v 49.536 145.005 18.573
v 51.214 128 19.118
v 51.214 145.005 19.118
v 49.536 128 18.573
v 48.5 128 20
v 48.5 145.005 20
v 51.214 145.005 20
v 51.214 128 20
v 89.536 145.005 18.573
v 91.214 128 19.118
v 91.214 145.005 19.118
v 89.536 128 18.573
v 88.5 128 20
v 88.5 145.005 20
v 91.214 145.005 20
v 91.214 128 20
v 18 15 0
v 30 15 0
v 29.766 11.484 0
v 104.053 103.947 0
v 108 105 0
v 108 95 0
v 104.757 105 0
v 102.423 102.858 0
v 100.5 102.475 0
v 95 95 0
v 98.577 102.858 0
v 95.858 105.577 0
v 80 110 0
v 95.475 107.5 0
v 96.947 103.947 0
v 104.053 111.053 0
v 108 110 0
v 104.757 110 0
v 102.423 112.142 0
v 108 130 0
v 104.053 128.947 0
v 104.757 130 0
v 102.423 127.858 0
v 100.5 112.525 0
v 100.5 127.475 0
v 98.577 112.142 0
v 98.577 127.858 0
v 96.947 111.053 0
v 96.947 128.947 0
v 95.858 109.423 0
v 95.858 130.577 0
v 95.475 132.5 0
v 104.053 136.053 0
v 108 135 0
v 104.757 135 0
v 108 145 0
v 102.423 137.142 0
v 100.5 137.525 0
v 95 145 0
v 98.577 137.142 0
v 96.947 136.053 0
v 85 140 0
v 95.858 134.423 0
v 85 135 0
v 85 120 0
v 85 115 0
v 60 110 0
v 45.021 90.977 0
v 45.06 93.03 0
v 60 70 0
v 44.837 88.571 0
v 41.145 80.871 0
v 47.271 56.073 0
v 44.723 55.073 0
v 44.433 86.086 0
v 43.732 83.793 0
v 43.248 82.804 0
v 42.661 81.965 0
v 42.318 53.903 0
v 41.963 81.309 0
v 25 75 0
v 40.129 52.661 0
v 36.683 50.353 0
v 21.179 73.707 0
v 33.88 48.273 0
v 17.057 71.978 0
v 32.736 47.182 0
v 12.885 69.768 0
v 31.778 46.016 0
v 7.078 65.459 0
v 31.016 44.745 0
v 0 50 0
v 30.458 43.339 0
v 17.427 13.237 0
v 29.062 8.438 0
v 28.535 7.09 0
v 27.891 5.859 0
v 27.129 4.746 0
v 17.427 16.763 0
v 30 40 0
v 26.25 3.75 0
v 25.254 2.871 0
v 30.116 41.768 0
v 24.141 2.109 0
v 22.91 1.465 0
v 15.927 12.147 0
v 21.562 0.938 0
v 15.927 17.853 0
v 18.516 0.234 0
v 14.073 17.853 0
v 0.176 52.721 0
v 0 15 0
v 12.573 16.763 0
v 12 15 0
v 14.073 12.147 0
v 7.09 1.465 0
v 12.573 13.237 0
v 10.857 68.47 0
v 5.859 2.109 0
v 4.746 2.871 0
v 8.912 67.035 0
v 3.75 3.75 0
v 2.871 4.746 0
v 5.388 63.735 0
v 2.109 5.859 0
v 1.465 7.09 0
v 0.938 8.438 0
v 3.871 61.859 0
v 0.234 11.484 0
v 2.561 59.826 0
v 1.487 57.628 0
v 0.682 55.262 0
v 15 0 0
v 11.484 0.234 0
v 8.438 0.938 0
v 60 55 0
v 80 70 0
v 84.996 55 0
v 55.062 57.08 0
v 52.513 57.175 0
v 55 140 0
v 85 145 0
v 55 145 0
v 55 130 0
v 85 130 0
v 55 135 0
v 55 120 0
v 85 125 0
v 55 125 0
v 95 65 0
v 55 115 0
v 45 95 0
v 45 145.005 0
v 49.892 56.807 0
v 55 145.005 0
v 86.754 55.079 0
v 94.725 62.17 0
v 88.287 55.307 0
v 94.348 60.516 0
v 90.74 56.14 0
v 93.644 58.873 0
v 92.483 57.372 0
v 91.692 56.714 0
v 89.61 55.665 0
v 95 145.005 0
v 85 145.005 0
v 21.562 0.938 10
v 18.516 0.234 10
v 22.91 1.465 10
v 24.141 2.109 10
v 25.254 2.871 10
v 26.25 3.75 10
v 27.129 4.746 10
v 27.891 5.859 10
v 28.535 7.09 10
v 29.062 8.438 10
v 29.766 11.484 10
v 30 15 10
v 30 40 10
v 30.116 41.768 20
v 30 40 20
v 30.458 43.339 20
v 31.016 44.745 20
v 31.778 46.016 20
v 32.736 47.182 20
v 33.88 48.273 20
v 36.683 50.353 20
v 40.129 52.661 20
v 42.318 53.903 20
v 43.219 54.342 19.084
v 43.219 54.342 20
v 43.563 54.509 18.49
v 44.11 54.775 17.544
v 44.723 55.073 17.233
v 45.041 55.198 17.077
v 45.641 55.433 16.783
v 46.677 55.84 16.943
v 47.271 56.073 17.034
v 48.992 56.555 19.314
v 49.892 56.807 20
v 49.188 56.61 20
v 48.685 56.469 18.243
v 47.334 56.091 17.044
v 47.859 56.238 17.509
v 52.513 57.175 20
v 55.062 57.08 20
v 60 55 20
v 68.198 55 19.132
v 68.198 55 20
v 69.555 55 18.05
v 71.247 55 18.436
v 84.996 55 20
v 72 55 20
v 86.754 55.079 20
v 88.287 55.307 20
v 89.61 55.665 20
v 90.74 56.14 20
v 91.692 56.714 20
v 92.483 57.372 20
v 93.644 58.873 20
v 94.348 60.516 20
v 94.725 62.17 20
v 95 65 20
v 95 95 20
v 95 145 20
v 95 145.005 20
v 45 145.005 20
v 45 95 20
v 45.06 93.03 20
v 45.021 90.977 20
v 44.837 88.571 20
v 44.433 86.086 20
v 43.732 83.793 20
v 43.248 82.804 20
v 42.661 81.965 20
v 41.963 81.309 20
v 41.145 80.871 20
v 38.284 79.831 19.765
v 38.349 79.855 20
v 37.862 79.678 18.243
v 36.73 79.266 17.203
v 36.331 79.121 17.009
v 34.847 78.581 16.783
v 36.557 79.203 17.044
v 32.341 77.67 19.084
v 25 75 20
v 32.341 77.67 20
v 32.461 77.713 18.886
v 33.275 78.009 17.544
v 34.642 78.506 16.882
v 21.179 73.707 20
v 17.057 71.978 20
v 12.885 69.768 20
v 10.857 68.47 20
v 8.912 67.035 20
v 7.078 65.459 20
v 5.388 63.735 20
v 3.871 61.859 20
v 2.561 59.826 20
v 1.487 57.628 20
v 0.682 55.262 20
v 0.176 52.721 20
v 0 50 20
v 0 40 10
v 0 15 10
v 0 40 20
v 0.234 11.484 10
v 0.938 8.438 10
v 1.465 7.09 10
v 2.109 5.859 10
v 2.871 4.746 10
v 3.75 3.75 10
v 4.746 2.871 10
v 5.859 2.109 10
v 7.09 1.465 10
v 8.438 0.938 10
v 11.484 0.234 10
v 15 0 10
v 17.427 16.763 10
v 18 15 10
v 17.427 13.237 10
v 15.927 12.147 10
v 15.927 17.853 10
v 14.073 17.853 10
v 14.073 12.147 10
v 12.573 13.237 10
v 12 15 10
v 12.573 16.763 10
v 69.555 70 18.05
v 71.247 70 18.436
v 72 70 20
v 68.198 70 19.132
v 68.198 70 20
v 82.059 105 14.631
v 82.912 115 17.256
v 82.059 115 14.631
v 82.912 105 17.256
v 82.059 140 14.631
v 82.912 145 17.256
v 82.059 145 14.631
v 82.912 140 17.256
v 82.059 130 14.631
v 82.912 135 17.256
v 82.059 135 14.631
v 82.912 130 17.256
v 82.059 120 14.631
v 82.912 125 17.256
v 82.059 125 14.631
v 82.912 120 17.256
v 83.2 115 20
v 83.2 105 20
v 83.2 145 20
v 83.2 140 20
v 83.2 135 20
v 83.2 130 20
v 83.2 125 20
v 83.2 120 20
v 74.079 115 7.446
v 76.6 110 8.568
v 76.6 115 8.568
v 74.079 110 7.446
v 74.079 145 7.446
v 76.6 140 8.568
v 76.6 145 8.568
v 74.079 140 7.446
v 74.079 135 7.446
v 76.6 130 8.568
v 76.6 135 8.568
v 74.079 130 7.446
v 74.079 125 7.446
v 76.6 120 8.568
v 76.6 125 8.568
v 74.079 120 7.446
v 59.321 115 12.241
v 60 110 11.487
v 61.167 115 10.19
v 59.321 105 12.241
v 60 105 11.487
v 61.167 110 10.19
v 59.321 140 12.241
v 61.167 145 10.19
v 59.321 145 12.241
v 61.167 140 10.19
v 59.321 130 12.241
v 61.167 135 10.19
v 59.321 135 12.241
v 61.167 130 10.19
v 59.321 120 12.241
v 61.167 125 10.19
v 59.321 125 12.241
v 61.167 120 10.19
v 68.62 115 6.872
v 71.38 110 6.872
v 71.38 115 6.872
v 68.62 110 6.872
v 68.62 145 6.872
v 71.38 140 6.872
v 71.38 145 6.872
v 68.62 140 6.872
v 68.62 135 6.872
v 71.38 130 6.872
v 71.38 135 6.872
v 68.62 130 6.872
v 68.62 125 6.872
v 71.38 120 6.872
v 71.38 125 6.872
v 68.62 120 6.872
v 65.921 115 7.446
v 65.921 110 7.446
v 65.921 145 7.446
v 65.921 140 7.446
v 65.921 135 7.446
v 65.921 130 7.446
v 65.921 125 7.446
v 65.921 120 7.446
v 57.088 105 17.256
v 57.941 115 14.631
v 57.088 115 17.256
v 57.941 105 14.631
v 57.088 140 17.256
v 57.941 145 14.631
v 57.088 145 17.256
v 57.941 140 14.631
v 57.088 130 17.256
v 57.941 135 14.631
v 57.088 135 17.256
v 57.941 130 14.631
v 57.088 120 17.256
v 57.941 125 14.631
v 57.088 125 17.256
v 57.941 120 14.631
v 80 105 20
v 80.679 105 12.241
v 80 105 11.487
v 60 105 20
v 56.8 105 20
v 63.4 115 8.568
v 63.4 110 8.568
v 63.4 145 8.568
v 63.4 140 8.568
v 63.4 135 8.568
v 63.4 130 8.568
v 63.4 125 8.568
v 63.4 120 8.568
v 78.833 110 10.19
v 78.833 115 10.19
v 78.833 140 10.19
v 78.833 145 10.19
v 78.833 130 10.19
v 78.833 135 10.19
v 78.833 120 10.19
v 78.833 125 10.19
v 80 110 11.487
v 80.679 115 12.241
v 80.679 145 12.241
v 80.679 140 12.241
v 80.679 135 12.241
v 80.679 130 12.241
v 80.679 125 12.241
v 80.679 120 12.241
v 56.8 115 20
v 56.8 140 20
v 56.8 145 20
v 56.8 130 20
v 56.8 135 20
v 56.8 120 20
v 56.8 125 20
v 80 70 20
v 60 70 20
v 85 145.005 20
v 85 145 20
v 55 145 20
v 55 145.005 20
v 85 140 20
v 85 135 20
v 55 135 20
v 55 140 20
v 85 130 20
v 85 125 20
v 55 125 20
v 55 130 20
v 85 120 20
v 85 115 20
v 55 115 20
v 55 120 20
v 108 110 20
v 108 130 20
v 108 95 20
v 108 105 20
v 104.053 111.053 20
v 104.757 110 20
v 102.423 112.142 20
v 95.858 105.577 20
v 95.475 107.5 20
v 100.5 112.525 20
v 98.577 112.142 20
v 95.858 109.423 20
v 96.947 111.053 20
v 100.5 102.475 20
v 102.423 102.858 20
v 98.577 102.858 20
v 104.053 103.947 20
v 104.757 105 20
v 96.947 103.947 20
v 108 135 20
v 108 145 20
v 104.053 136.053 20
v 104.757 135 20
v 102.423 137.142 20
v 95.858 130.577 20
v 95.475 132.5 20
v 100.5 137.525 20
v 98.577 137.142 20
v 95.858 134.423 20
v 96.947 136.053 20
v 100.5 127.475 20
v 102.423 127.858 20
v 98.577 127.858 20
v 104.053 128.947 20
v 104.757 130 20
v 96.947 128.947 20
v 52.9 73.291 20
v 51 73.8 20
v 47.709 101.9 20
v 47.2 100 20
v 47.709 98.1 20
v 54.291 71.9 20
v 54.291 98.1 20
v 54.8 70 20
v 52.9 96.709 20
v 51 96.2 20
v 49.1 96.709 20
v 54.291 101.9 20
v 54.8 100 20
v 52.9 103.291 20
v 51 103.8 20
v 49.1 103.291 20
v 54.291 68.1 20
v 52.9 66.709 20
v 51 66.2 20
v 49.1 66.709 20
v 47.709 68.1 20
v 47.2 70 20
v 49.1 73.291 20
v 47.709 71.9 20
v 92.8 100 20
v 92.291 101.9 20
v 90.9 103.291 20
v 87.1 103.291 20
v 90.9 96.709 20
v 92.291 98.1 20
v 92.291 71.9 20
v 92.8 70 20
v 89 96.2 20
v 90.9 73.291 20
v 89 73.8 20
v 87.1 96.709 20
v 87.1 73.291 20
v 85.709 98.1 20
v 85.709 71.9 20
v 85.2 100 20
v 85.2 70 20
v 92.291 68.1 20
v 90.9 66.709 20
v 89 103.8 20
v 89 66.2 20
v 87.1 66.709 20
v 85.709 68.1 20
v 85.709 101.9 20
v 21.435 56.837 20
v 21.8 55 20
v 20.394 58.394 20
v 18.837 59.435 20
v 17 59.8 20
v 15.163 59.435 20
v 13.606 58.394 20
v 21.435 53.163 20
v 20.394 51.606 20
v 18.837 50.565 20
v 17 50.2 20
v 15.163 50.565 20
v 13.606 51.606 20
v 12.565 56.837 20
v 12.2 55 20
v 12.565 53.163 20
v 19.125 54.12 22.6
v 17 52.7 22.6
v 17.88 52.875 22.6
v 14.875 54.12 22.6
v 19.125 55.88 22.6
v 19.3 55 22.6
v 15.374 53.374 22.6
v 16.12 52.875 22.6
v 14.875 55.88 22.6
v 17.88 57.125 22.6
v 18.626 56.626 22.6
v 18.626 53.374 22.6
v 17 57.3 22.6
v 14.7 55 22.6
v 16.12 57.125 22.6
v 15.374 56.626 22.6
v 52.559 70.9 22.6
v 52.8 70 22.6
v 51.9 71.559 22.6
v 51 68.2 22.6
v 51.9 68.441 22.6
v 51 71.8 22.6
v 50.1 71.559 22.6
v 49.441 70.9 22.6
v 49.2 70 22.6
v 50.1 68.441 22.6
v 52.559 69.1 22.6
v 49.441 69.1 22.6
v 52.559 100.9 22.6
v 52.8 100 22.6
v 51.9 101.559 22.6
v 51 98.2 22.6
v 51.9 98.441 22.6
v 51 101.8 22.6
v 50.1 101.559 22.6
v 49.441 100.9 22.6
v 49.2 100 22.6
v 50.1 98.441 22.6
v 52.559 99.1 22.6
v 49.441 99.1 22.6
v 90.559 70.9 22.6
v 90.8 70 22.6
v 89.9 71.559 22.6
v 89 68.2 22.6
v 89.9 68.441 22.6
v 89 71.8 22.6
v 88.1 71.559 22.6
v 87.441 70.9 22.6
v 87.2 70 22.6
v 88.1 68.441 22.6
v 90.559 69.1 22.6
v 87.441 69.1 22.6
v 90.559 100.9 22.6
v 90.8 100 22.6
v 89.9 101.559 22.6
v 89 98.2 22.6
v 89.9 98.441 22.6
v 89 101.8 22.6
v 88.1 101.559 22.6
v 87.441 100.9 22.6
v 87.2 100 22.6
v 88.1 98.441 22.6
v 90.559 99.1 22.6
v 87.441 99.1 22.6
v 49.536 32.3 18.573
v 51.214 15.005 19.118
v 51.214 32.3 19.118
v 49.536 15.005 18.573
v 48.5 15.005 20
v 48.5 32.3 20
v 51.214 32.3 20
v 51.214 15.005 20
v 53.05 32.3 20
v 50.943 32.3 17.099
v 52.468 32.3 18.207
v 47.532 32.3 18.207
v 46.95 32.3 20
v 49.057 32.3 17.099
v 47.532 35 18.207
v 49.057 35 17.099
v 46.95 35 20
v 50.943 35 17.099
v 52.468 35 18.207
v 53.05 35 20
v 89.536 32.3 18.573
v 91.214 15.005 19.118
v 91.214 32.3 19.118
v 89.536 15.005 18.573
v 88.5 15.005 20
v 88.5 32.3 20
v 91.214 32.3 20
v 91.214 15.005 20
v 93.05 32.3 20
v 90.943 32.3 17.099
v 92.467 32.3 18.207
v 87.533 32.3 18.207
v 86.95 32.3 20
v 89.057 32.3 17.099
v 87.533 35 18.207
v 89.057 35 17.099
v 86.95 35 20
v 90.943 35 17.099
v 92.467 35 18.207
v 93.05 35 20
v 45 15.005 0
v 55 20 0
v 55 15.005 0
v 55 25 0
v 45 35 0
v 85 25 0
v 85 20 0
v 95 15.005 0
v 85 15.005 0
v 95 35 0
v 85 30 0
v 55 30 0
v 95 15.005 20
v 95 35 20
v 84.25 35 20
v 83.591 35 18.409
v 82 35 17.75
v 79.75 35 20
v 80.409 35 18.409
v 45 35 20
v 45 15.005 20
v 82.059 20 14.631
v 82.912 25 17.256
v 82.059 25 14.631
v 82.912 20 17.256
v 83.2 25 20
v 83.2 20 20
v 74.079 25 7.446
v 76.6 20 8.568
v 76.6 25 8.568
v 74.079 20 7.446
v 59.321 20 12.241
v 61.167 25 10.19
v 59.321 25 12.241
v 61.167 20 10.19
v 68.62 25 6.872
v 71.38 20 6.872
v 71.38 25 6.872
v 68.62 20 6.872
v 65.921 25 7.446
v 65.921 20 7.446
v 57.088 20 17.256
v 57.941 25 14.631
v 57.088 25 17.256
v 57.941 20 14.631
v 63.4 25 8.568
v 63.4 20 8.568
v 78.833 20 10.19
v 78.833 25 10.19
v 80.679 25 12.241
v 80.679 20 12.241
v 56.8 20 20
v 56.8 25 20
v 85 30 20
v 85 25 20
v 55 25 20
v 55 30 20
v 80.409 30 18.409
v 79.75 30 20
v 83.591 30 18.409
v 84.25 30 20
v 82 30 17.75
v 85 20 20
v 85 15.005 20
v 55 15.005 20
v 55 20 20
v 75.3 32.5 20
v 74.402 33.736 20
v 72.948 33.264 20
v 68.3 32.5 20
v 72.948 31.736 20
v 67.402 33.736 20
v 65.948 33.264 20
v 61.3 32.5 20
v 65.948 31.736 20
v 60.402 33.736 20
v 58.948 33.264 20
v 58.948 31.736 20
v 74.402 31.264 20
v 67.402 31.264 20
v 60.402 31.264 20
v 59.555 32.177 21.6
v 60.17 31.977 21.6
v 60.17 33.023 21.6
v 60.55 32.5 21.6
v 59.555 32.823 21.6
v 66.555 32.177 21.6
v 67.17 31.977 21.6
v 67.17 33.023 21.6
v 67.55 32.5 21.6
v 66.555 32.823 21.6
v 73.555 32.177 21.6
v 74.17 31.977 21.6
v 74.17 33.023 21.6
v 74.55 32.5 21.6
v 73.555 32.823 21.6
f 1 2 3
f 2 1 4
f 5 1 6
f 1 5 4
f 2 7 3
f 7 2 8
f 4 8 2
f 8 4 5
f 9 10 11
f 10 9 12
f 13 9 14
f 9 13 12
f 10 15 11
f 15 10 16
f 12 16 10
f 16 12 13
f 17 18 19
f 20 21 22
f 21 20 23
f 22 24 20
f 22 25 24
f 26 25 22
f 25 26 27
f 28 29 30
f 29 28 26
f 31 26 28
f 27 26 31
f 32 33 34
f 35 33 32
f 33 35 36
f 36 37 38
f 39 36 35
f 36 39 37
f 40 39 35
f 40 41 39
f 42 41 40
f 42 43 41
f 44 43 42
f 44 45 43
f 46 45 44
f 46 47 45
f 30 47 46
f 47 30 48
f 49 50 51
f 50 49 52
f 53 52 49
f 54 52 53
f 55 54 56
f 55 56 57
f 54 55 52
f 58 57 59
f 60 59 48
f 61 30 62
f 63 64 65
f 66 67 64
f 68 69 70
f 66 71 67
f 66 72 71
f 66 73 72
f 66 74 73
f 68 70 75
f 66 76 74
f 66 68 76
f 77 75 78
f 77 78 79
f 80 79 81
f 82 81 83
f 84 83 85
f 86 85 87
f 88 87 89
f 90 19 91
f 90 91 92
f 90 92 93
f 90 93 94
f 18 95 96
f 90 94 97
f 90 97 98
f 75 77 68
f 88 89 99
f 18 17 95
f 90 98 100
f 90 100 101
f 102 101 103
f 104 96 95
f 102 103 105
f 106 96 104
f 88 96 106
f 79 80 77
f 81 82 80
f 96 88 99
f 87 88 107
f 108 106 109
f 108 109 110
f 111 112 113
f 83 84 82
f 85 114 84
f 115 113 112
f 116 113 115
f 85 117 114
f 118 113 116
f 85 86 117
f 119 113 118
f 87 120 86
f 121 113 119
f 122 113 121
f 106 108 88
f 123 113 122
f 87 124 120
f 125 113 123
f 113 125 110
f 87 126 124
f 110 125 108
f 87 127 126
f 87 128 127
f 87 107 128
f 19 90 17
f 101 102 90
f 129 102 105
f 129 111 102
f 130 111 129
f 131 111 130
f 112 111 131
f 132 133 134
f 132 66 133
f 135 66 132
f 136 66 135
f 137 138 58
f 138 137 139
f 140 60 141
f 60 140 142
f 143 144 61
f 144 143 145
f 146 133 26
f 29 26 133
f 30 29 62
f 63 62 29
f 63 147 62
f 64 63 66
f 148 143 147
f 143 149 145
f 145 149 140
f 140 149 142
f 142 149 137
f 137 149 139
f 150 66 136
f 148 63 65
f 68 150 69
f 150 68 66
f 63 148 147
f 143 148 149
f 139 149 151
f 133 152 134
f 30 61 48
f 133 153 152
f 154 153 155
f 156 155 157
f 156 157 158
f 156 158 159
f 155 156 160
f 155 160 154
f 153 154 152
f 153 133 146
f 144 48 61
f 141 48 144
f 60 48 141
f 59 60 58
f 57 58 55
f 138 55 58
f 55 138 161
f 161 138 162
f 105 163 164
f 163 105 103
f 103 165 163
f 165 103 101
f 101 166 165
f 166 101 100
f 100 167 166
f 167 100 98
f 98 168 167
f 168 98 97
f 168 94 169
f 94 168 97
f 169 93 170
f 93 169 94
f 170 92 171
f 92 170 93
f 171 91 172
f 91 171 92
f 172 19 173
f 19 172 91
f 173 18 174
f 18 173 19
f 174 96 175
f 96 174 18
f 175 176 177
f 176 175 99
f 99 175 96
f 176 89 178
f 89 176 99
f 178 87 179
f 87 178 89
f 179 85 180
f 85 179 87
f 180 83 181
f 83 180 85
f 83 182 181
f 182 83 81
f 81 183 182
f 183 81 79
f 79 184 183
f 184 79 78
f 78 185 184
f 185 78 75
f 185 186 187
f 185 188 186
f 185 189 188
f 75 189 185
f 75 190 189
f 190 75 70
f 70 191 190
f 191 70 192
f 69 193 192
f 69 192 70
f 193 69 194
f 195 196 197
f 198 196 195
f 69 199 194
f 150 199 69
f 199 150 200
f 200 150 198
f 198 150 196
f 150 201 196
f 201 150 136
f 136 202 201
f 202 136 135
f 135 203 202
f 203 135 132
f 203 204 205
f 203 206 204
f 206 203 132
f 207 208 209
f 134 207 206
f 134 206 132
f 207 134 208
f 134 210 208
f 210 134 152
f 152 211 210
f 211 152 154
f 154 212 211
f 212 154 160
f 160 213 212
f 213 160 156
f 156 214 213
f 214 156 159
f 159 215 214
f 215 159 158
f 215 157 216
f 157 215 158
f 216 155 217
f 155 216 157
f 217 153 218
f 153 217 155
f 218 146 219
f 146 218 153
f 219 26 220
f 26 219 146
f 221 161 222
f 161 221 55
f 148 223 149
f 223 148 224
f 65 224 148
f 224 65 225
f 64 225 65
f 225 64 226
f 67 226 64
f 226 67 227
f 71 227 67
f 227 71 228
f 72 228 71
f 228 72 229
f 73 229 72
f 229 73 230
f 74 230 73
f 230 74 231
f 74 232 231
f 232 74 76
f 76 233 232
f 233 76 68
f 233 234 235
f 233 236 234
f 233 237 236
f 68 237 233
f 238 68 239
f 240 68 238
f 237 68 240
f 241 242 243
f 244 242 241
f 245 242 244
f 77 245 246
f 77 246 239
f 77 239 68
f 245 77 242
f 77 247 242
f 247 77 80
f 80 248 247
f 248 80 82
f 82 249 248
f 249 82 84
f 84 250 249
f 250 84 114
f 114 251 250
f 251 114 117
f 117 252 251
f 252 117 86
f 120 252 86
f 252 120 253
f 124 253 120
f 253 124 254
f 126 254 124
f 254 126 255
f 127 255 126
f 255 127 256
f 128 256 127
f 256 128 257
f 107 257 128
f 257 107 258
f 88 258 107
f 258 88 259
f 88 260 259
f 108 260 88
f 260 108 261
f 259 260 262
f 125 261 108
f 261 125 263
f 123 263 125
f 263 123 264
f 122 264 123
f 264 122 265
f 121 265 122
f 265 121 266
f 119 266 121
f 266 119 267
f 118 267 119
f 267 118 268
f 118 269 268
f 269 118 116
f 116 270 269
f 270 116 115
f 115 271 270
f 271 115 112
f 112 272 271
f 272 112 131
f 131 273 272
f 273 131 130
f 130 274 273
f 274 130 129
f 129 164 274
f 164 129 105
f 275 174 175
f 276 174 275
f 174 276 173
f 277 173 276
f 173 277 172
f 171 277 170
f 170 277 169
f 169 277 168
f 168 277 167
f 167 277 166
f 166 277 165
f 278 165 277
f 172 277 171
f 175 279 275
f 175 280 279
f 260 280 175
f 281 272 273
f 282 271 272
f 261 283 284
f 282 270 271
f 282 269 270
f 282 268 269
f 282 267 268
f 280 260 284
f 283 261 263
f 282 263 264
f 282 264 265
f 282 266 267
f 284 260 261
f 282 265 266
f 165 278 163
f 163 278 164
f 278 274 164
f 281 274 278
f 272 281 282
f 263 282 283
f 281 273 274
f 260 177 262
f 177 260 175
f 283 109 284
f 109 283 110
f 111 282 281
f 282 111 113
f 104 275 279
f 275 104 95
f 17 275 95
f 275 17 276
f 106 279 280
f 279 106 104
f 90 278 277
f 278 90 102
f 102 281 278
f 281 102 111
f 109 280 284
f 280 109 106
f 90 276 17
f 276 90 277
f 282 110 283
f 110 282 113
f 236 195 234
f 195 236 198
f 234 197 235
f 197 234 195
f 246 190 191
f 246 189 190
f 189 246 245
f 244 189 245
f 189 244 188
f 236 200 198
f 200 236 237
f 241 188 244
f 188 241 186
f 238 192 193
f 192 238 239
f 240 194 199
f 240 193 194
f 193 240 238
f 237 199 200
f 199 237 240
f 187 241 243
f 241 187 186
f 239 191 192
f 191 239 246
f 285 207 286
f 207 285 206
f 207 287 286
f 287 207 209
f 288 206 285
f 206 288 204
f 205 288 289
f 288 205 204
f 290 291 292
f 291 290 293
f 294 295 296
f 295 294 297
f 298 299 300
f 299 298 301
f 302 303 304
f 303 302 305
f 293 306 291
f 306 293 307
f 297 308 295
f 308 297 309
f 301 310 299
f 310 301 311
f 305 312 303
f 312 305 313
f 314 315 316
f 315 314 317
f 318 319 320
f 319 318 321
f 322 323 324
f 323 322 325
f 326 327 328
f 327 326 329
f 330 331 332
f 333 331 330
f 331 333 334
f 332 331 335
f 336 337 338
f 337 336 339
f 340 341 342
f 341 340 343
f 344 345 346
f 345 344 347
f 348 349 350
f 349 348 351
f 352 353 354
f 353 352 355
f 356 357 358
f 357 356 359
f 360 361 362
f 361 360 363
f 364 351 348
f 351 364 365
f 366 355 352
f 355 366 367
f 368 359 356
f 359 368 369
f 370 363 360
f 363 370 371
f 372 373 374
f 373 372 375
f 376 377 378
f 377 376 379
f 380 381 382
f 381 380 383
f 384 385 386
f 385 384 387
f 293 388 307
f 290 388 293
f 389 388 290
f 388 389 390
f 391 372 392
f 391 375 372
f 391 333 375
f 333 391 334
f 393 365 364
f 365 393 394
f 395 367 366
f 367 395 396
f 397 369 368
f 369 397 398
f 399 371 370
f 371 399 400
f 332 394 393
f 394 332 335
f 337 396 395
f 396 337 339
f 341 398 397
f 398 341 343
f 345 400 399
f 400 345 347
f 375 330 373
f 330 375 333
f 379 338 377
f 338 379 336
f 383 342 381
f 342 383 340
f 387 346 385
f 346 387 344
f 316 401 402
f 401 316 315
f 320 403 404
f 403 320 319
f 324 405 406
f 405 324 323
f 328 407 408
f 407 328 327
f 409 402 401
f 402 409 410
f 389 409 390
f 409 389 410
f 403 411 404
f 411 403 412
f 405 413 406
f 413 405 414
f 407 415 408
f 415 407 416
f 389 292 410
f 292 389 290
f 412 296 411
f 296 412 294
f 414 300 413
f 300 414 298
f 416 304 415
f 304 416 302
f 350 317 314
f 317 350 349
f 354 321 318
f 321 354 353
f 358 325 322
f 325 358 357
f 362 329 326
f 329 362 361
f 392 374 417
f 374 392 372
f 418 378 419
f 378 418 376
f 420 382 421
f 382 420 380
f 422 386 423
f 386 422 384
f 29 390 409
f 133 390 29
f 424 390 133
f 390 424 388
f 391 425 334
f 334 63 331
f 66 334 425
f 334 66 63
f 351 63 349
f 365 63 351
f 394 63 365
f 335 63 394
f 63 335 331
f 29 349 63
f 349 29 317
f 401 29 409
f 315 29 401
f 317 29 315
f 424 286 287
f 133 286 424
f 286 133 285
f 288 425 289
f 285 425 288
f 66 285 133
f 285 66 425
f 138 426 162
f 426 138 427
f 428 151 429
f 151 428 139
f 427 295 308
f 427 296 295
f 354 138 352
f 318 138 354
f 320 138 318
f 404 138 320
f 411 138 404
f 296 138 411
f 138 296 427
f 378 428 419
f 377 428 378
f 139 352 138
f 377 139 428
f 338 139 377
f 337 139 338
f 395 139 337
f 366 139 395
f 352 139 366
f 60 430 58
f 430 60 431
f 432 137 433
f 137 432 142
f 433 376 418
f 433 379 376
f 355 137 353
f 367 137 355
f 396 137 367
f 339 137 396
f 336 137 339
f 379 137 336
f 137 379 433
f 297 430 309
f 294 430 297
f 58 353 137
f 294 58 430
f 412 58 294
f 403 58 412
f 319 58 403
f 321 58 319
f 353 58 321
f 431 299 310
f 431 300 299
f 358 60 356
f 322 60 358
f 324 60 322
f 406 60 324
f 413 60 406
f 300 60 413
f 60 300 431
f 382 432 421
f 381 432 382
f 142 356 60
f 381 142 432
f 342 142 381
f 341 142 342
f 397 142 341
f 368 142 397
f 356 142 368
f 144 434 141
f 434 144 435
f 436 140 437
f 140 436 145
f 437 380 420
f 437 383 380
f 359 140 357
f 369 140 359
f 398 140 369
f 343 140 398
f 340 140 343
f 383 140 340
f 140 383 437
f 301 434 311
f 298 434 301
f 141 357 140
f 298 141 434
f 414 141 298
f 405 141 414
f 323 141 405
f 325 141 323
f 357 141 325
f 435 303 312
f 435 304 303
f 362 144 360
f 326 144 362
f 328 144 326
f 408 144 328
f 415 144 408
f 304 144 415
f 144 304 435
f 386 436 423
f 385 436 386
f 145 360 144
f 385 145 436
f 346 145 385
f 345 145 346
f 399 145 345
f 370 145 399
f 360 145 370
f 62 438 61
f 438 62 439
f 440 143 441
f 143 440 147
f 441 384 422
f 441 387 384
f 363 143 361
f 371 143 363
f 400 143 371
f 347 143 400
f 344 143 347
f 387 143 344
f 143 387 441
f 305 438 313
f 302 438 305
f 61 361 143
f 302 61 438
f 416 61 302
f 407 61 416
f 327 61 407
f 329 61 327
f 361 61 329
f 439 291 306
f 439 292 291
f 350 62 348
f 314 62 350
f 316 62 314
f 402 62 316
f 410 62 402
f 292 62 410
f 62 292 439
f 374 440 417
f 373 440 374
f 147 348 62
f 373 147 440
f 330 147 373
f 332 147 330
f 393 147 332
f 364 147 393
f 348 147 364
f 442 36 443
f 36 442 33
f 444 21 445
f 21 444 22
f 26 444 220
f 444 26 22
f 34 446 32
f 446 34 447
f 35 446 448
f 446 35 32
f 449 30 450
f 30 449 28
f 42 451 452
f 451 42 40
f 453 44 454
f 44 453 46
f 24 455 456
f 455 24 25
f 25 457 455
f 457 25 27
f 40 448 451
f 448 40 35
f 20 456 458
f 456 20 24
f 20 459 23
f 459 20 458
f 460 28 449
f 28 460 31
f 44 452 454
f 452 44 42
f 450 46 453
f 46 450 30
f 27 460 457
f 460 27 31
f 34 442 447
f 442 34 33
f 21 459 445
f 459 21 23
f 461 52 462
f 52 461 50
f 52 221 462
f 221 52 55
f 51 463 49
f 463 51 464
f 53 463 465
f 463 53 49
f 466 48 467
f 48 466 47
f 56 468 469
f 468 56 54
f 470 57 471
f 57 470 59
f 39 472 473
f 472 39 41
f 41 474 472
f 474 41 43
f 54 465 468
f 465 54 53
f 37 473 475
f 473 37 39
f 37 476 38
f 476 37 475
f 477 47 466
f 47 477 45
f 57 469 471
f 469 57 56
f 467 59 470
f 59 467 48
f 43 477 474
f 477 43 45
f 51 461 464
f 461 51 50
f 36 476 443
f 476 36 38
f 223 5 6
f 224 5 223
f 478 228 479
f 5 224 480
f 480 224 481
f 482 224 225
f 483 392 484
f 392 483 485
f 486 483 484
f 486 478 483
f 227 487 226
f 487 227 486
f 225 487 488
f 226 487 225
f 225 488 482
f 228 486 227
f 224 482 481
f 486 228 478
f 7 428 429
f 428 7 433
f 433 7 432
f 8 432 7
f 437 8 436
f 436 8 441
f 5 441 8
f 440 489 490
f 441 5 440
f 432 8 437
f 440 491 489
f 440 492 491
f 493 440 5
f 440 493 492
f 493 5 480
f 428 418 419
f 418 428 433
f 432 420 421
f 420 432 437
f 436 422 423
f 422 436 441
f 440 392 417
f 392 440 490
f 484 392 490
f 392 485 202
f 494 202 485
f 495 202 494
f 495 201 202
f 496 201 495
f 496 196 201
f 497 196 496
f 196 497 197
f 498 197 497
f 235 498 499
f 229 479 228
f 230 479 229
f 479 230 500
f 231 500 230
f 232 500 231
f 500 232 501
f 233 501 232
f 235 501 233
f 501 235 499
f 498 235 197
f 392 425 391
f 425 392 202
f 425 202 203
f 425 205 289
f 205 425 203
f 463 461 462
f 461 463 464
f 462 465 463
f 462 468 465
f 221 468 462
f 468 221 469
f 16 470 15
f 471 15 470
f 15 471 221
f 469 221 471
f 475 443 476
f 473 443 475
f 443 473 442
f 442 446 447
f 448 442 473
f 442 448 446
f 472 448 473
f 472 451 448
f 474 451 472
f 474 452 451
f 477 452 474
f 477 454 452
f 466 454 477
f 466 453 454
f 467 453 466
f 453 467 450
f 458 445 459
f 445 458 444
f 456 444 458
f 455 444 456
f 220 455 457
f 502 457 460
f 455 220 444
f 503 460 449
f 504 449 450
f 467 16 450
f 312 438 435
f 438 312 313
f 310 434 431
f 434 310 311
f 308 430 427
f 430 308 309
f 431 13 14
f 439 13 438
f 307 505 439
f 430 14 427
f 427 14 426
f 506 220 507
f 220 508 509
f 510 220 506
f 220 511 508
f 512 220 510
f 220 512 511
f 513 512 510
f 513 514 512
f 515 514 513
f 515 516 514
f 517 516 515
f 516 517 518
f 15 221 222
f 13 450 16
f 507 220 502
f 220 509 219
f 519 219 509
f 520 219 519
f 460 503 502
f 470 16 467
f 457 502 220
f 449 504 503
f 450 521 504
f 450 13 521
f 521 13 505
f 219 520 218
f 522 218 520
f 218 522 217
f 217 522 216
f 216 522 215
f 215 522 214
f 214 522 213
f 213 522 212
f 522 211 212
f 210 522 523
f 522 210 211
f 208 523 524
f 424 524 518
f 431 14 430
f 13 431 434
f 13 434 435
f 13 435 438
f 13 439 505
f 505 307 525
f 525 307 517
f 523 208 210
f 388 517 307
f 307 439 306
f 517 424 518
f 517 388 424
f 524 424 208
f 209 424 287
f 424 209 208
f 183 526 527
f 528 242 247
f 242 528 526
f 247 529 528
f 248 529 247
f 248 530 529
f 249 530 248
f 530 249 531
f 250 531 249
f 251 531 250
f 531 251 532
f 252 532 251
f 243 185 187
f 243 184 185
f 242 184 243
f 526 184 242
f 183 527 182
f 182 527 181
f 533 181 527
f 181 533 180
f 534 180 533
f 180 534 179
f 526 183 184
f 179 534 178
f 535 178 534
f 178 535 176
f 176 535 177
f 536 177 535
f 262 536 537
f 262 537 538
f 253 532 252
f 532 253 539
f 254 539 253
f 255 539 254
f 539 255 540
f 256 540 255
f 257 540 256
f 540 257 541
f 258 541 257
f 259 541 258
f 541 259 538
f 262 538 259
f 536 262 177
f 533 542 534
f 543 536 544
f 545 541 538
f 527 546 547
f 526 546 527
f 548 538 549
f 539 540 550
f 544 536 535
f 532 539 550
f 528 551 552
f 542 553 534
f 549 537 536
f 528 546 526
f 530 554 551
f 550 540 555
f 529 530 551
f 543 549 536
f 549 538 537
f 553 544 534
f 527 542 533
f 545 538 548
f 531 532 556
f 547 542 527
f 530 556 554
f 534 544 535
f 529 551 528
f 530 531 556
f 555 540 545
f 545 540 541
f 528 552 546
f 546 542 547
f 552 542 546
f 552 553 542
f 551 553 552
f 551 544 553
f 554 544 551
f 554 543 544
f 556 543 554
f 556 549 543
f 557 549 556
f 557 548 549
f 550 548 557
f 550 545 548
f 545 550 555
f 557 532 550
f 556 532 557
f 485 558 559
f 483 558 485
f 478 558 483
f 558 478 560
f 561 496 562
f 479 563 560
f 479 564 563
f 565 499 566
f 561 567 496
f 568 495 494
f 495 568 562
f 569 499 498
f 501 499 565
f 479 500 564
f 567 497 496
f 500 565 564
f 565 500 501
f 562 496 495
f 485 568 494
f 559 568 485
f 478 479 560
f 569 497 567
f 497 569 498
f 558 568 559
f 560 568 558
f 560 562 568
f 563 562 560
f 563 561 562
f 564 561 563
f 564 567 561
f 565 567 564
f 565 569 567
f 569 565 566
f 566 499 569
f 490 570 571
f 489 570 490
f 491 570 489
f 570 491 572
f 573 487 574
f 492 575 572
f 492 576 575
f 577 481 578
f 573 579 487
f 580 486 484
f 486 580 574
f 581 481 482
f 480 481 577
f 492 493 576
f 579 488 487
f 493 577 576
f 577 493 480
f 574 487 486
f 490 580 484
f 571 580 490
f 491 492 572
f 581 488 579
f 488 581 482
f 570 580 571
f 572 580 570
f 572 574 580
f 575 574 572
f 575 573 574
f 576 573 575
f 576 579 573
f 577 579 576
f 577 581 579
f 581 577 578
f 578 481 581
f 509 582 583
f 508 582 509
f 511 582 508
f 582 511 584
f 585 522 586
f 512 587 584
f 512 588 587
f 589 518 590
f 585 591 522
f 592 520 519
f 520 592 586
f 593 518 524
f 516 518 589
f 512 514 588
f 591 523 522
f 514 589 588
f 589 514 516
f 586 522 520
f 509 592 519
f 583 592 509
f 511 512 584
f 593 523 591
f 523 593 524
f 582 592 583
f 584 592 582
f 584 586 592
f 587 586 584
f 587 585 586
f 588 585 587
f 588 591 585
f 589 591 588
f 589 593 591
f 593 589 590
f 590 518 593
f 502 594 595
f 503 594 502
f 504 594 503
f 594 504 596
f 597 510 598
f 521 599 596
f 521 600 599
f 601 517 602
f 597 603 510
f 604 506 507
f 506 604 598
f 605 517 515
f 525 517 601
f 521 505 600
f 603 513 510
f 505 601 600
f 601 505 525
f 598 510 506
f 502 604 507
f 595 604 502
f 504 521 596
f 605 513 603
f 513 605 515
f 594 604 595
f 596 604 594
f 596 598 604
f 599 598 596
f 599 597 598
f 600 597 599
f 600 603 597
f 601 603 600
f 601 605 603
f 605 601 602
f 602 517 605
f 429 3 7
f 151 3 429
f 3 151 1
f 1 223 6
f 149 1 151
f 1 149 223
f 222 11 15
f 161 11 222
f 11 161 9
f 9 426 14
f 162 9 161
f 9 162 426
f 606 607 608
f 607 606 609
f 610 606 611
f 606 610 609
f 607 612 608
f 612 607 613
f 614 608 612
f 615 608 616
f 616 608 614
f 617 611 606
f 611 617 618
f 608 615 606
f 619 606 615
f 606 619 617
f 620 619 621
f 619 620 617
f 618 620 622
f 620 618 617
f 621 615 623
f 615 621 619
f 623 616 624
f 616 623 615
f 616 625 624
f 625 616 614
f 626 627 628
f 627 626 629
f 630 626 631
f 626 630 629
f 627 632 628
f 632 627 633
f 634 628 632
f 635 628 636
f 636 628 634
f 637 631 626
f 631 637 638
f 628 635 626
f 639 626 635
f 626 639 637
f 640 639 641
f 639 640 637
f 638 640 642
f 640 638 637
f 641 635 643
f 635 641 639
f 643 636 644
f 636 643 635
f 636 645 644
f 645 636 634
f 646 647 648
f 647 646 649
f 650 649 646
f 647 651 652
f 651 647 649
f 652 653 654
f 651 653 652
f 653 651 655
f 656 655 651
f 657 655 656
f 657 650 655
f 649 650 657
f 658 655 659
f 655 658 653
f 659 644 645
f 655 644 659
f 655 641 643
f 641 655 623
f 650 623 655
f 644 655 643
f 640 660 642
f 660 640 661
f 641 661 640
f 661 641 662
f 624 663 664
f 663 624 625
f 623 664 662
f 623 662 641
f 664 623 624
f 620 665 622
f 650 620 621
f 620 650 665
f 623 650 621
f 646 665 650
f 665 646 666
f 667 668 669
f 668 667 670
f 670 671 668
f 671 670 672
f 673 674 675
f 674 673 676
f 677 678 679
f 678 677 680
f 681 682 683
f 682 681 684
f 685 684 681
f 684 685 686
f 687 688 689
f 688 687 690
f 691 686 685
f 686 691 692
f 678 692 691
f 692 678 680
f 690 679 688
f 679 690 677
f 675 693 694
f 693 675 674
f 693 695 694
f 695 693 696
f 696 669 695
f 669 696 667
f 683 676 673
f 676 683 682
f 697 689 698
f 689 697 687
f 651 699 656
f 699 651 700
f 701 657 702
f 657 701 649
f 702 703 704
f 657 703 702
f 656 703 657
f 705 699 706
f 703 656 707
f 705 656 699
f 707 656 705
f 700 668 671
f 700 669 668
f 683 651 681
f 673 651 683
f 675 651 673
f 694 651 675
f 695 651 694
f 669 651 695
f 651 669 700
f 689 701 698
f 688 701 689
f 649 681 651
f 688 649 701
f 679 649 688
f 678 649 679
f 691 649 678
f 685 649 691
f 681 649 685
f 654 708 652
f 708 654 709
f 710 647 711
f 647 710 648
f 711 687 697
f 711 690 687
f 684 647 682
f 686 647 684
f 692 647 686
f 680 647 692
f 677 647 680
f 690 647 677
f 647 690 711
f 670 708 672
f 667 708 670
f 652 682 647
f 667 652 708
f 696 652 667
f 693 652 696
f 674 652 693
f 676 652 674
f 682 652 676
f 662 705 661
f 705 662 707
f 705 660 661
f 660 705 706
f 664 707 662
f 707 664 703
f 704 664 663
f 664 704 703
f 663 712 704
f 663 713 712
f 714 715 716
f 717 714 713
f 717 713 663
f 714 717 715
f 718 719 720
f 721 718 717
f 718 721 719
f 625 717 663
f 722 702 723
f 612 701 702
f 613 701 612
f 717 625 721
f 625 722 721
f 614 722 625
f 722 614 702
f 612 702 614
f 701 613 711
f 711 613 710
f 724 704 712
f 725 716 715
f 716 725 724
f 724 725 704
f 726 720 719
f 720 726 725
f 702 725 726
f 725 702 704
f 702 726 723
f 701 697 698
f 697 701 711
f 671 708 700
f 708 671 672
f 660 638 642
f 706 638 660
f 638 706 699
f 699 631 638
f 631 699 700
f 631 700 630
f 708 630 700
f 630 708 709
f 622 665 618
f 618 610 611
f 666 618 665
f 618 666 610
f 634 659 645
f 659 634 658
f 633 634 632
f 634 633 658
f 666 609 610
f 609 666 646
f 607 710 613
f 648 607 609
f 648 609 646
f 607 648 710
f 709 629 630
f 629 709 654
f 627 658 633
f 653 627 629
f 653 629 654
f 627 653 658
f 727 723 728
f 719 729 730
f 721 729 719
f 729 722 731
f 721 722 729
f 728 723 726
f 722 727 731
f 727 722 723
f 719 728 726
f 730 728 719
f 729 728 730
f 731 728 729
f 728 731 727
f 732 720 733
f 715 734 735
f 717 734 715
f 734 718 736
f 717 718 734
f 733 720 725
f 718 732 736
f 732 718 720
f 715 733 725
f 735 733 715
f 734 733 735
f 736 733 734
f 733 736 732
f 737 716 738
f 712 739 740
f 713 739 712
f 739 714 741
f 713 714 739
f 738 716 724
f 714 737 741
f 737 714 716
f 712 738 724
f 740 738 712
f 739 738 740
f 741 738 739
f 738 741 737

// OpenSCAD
include <dumbstick.scad>
translate([0,0,20]) B0_bottom();
translate([0,-130,20]) B0_hat_bottom();
